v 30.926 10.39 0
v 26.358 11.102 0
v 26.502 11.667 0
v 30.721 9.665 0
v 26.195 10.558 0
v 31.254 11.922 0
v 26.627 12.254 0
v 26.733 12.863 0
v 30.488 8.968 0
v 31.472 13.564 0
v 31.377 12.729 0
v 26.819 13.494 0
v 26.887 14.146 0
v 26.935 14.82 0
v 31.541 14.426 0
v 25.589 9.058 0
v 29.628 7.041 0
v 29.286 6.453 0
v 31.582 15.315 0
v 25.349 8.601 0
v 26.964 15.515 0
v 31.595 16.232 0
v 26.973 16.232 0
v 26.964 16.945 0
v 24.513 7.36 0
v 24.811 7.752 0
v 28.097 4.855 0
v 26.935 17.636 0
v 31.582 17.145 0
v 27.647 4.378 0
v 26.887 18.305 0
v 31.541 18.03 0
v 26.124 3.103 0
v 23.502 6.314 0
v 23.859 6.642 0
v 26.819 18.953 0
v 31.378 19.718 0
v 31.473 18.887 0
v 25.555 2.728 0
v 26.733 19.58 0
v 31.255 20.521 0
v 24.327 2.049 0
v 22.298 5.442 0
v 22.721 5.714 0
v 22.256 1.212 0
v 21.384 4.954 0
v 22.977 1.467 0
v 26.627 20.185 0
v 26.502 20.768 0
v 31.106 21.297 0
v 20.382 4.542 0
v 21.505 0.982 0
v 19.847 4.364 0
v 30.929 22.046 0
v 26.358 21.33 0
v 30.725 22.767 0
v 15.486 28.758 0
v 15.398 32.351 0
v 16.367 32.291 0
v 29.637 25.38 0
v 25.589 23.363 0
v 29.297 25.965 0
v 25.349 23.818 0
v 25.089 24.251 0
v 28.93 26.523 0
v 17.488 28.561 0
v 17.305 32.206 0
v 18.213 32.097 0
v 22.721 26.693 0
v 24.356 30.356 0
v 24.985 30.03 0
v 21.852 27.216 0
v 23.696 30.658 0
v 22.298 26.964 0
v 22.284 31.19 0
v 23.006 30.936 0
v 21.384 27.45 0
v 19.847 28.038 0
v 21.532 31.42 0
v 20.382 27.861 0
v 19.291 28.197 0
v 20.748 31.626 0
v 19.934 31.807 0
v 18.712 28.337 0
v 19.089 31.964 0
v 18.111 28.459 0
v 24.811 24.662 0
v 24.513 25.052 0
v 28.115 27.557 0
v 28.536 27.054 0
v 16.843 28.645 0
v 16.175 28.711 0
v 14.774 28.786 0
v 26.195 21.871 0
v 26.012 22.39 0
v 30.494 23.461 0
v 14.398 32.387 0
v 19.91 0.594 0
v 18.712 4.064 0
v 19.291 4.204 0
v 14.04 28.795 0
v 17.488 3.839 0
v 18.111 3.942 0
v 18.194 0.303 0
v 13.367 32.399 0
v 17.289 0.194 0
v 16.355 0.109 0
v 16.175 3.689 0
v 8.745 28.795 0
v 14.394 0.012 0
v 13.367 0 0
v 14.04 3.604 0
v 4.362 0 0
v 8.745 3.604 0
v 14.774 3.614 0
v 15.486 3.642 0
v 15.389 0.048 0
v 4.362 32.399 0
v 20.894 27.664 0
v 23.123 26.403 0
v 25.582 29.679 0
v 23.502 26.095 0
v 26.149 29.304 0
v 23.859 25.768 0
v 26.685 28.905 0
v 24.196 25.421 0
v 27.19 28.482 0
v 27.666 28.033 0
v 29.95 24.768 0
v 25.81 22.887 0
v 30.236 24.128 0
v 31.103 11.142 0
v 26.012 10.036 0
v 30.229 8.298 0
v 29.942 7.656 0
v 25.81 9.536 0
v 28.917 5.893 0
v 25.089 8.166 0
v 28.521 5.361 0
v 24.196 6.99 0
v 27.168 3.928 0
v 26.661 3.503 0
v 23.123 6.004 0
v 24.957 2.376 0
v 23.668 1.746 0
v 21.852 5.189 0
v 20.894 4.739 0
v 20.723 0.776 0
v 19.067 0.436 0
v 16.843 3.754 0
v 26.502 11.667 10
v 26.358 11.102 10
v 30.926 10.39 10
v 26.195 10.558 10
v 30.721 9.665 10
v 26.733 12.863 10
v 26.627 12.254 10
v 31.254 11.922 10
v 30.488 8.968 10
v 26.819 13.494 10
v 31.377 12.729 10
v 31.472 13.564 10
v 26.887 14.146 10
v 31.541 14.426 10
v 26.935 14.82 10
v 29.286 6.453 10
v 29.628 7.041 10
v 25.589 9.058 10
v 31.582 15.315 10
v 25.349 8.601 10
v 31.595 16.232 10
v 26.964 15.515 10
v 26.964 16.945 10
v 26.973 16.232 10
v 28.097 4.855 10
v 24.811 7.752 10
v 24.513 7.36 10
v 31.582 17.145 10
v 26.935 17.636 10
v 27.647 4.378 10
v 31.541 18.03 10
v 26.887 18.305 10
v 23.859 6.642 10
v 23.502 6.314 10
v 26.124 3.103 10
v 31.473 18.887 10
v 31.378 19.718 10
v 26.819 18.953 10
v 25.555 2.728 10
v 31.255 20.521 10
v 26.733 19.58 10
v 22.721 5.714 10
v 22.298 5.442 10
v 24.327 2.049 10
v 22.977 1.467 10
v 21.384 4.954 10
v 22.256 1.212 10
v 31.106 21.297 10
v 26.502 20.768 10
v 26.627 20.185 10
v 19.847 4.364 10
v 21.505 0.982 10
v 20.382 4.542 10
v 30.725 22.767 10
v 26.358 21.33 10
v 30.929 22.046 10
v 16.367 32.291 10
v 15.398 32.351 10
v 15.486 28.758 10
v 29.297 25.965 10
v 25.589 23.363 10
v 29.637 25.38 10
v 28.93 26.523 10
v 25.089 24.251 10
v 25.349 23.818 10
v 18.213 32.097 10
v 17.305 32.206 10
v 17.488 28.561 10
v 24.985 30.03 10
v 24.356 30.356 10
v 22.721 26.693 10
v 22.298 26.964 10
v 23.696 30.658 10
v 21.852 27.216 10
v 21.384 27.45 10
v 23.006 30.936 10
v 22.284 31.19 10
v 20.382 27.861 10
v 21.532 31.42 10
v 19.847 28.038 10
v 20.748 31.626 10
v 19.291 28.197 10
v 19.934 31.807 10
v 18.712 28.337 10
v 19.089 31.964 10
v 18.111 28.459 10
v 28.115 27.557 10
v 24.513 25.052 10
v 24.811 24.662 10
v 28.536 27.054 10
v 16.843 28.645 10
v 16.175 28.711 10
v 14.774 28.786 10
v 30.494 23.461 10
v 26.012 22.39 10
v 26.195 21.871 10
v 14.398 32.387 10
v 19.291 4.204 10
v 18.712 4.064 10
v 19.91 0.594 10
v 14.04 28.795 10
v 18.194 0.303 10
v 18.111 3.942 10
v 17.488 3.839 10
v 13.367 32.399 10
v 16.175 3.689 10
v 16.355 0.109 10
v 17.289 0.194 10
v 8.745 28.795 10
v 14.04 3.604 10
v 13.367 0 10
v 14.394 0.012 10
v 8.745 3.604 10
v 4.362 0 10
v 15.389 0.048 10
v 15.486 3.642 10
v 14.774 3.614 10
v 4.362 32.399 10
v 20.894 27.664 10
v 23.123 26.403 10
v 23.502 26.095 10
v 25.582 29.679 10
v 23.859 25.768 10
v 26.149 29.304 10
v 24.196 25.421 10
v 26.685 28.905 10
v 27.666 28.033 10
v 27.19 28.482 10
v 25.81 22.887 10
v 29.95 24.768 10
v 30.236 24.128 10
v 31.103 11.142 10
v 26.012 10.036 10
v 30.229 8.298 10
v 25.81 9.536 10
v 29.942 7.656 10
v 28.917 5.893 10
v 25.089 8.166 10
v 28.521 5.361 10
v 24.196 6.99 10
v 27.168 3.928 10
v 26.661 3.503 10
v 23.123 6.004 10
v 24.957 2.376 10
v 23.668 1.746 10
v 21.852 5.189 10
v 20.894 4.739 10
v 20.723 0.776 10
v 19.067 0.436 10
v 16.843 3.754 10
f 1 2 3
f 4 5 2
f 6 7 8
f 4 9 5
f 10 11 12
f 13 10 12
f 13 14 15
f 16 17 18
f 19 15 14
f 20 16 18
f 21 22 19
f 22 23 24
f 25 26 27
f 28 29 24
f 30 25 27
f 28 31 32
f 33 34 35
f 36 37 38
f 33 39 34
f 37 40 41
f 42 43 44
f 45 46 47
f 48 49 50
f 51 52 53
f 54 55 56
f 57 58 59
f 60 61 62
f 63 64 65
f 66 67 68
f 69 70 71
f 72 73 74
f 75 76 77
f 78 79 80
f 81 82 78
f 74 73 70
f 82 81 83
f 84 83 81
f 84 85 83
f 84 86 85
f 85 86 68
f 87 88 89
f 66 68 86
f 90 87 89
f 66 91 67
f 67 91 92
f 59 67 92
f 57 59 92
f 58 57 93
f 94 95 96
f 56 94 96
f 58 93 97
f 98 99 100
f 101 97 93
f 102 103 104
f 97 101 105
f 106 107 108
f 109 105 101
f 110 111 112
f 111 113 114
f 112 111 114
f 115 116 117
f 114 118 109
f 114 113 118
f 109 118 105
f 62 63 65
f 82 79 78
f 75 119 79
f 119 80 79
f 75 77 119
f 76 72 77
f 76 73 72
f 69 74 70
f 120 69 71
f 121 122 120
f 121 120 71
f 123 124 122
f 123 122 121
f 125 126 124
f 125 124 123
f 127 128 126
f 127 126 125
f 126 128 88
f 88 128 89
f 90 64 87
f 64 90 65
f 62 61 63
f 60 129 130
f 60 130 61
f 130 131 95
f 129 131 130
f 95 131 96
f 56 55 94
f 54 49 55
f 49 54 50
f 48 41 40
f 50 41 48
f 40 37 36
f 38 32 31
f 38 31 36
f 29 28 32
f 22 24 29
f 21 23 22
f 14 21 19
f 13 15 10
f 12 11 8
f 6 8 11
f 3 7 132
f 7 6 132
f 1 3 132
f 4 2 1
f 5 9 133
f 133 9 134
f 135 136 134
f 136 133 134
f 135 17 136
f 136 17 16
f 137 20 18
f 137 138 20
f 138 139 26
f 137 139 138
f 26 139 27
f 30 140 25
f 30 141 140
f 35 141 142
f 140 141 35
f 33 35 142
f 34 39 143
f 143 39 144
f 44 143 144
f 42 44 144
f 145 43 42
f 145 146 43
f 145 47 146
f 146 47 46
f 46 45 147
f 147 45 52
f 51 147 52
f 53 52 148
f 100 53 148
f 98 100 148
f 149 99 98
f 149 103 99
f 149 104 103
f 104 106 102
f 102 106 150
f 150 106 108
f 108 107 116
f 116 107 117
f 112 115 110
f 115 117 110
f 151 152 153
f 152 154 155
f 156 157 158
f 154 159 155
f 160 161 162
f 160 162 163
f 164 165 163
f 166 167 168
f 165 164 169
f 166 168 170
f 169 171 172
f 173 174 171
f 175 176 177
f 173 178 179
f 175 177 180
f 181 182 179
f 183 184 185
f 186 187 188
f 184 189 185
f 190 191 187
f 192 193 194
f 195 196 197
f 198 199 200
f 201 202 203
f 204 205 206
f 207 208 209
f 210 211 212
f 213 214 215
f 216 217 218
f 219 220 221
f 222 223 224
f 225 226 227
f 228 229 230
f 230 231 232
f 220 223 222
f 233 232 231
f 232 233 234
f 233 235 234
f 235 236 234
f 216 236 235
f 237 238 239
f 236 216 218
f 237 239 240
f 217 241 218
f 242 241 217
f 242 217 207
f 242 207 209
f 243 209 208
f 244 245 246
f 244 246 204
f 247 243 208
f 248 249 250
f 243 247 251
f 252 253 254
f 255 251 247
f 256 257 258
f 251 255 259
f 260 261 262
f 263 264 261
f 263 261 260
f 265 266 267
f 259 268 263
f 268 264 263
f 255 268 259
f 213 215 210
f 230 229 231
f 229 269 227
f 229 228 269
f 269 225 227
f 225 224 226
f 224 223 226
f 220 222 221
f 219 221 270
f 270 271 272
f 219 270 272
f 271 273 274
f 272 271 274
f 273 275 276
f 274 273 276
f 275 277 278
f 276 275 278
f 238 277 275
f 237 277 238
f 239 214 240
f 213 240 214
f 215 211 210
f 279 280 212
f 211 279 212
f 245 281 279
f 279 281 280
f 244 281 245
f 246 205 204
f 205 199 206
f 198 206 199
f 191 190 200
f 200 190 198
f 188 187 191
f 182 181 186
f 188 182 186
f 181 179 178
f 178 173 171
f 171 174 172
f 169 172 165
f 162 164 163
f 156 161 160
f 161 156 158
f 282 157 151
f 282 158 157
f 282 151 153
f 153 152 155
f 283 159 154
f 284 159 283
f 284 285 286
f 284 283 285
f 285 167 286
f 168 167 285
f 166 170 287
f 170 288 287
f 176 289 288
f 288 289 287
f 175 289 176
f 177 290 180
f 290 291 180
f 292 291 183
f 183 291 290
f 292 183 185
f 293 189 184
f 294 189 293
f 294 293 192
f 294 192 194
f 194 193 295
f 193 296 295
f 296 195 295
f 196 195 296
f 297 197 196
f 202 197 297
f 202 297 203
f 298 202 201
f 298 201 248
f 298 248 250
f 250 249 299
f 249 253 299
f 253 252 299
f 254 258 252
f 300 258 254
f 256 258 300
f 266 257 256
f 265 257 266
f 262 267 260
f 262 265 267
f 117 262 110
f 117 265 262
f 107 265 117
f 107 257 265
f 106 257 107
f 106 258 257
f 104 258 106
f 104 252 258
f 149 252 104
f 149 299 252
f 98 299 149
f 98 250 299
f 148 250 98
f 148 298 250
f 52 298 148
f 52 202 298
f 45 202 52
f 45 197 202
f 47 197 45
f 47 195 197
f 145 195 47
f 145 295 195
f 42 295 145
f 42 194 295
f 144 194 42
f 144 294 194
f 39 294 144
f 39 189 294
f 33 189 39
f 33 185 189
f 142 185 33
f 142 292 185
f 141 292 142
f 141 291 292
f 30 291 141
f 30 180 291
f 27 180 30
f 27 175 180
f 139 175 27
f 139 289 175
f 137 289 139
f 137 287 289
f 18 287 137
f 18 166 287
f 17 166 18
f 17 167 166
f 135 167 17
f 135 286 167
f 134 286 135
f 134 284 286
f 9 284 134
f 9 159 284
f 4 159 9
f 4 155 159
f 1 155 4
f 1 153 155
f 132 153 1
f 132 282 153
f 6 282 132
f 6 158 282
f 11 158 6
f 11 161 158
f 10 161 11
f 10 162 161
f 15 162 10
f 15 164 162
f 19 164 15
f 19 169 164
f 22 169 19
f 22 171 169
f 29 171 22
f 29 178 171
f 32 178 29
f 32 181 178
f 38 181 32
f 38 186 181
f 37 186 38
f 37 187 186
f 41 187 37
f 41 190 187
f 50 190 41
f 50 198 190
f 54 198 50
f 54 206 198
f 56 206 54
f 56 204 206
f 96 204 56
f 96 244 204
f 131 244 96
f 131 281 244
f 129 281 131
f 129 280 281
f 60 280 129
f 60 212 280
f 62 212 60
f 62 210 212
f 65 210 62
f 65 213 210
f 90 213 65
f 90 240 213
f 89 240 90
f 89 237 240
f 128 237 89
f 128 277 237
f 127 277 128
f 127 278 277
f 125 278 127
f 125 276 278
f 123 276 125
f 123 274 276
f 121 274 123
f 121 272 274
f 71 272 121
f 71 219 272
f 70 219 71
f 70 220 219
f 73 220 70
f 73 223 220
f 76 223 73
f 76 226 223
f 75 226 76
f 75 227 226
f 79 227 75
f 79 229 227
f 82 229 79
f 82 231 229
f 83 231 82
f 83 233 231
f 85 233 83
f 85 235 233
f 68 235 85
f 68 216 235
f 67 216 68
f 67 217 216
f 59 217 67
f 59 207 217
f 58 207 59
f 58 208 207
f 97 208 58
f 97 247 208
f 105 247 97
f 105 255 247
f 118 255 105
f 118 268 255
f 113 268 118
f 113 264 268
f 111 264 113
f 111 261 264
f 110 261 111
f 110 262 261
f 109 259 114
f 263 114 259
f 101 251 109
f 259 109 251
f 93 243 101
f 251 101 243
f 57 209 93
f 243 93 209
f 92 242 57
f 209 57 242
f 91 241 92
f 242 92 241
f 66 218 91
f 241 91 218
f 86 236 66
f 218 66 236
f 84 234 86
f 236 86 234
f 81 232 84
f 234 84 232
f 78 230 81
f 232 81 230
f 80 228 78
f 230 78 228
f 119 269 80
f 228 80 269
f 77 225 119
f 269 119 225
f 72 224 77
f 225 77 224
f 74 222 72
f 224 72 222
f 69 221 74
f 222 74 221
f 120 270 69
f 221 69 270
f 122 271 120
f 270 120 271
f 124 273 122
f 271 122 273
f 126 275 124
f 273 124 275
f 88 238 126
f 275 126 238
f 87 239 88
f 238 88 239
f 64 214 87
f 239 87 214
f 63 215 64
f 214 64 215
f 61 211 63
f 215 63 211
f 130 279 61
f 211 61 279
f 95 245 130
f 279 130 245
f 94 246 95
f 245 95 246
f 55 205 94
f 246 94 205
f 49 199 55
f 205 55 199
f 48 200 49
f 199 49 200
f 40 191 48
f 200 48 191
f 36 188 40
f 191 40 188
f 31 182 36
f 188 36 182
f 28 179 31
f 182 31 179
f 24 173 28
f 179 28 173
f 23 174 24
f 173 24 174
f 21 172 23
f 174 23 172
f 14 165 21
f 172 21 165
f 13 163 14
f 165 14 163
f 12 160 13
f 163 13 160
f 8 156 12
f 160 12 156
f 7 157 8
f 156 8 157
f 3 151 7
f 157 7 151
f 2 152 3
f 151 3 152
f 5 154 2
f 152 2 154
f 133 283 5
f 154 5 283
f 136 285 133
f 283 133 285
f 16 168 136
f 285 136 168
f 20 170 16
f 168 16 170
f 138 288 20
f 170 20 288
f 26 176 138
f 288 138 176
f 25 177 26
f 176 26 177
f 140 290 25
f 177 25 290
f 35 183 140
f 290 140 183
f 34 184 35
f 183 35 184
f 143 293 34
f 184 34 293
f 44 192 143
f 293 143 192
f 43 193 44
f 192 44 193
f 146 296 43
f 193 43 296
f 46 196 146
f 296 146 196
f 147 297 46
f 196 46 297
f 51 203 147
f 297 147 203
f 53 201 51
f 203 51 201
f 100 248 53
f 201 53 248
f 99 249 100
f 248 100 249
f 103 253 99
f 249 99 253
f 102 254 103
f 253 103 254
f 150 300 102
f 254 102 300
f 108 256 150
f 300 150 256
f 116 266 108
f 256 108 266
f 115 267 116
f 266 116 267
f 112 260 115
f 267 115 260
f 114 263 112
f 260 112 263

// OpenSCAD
$fn = 140;
$fs = 0.1;

// TTF ,OTF font name or path
font_path = "Infini Picto";

// Font size
font_size = 32;

// Letter extrusion thickness
thickness = 10;

// Letter
letter = "D";
  font = str(font_path);
  

// 2D Letter
module letter_2d(letter) {
  // Import font
  font = str(font_path);

  // show 2d letter
  text(letter, font=font, size=font_size);
}

// 3D Letter
module letter_3d(letter) {
  // Import OTF font
  font = str(font_path);

  // Extrusion to create 3D
  linear_extrude(height = thickness) {
    text(letter, font=font, size=font_size);
  }
}

// Show 3D
render() {
  letter_3d(letter);
}
